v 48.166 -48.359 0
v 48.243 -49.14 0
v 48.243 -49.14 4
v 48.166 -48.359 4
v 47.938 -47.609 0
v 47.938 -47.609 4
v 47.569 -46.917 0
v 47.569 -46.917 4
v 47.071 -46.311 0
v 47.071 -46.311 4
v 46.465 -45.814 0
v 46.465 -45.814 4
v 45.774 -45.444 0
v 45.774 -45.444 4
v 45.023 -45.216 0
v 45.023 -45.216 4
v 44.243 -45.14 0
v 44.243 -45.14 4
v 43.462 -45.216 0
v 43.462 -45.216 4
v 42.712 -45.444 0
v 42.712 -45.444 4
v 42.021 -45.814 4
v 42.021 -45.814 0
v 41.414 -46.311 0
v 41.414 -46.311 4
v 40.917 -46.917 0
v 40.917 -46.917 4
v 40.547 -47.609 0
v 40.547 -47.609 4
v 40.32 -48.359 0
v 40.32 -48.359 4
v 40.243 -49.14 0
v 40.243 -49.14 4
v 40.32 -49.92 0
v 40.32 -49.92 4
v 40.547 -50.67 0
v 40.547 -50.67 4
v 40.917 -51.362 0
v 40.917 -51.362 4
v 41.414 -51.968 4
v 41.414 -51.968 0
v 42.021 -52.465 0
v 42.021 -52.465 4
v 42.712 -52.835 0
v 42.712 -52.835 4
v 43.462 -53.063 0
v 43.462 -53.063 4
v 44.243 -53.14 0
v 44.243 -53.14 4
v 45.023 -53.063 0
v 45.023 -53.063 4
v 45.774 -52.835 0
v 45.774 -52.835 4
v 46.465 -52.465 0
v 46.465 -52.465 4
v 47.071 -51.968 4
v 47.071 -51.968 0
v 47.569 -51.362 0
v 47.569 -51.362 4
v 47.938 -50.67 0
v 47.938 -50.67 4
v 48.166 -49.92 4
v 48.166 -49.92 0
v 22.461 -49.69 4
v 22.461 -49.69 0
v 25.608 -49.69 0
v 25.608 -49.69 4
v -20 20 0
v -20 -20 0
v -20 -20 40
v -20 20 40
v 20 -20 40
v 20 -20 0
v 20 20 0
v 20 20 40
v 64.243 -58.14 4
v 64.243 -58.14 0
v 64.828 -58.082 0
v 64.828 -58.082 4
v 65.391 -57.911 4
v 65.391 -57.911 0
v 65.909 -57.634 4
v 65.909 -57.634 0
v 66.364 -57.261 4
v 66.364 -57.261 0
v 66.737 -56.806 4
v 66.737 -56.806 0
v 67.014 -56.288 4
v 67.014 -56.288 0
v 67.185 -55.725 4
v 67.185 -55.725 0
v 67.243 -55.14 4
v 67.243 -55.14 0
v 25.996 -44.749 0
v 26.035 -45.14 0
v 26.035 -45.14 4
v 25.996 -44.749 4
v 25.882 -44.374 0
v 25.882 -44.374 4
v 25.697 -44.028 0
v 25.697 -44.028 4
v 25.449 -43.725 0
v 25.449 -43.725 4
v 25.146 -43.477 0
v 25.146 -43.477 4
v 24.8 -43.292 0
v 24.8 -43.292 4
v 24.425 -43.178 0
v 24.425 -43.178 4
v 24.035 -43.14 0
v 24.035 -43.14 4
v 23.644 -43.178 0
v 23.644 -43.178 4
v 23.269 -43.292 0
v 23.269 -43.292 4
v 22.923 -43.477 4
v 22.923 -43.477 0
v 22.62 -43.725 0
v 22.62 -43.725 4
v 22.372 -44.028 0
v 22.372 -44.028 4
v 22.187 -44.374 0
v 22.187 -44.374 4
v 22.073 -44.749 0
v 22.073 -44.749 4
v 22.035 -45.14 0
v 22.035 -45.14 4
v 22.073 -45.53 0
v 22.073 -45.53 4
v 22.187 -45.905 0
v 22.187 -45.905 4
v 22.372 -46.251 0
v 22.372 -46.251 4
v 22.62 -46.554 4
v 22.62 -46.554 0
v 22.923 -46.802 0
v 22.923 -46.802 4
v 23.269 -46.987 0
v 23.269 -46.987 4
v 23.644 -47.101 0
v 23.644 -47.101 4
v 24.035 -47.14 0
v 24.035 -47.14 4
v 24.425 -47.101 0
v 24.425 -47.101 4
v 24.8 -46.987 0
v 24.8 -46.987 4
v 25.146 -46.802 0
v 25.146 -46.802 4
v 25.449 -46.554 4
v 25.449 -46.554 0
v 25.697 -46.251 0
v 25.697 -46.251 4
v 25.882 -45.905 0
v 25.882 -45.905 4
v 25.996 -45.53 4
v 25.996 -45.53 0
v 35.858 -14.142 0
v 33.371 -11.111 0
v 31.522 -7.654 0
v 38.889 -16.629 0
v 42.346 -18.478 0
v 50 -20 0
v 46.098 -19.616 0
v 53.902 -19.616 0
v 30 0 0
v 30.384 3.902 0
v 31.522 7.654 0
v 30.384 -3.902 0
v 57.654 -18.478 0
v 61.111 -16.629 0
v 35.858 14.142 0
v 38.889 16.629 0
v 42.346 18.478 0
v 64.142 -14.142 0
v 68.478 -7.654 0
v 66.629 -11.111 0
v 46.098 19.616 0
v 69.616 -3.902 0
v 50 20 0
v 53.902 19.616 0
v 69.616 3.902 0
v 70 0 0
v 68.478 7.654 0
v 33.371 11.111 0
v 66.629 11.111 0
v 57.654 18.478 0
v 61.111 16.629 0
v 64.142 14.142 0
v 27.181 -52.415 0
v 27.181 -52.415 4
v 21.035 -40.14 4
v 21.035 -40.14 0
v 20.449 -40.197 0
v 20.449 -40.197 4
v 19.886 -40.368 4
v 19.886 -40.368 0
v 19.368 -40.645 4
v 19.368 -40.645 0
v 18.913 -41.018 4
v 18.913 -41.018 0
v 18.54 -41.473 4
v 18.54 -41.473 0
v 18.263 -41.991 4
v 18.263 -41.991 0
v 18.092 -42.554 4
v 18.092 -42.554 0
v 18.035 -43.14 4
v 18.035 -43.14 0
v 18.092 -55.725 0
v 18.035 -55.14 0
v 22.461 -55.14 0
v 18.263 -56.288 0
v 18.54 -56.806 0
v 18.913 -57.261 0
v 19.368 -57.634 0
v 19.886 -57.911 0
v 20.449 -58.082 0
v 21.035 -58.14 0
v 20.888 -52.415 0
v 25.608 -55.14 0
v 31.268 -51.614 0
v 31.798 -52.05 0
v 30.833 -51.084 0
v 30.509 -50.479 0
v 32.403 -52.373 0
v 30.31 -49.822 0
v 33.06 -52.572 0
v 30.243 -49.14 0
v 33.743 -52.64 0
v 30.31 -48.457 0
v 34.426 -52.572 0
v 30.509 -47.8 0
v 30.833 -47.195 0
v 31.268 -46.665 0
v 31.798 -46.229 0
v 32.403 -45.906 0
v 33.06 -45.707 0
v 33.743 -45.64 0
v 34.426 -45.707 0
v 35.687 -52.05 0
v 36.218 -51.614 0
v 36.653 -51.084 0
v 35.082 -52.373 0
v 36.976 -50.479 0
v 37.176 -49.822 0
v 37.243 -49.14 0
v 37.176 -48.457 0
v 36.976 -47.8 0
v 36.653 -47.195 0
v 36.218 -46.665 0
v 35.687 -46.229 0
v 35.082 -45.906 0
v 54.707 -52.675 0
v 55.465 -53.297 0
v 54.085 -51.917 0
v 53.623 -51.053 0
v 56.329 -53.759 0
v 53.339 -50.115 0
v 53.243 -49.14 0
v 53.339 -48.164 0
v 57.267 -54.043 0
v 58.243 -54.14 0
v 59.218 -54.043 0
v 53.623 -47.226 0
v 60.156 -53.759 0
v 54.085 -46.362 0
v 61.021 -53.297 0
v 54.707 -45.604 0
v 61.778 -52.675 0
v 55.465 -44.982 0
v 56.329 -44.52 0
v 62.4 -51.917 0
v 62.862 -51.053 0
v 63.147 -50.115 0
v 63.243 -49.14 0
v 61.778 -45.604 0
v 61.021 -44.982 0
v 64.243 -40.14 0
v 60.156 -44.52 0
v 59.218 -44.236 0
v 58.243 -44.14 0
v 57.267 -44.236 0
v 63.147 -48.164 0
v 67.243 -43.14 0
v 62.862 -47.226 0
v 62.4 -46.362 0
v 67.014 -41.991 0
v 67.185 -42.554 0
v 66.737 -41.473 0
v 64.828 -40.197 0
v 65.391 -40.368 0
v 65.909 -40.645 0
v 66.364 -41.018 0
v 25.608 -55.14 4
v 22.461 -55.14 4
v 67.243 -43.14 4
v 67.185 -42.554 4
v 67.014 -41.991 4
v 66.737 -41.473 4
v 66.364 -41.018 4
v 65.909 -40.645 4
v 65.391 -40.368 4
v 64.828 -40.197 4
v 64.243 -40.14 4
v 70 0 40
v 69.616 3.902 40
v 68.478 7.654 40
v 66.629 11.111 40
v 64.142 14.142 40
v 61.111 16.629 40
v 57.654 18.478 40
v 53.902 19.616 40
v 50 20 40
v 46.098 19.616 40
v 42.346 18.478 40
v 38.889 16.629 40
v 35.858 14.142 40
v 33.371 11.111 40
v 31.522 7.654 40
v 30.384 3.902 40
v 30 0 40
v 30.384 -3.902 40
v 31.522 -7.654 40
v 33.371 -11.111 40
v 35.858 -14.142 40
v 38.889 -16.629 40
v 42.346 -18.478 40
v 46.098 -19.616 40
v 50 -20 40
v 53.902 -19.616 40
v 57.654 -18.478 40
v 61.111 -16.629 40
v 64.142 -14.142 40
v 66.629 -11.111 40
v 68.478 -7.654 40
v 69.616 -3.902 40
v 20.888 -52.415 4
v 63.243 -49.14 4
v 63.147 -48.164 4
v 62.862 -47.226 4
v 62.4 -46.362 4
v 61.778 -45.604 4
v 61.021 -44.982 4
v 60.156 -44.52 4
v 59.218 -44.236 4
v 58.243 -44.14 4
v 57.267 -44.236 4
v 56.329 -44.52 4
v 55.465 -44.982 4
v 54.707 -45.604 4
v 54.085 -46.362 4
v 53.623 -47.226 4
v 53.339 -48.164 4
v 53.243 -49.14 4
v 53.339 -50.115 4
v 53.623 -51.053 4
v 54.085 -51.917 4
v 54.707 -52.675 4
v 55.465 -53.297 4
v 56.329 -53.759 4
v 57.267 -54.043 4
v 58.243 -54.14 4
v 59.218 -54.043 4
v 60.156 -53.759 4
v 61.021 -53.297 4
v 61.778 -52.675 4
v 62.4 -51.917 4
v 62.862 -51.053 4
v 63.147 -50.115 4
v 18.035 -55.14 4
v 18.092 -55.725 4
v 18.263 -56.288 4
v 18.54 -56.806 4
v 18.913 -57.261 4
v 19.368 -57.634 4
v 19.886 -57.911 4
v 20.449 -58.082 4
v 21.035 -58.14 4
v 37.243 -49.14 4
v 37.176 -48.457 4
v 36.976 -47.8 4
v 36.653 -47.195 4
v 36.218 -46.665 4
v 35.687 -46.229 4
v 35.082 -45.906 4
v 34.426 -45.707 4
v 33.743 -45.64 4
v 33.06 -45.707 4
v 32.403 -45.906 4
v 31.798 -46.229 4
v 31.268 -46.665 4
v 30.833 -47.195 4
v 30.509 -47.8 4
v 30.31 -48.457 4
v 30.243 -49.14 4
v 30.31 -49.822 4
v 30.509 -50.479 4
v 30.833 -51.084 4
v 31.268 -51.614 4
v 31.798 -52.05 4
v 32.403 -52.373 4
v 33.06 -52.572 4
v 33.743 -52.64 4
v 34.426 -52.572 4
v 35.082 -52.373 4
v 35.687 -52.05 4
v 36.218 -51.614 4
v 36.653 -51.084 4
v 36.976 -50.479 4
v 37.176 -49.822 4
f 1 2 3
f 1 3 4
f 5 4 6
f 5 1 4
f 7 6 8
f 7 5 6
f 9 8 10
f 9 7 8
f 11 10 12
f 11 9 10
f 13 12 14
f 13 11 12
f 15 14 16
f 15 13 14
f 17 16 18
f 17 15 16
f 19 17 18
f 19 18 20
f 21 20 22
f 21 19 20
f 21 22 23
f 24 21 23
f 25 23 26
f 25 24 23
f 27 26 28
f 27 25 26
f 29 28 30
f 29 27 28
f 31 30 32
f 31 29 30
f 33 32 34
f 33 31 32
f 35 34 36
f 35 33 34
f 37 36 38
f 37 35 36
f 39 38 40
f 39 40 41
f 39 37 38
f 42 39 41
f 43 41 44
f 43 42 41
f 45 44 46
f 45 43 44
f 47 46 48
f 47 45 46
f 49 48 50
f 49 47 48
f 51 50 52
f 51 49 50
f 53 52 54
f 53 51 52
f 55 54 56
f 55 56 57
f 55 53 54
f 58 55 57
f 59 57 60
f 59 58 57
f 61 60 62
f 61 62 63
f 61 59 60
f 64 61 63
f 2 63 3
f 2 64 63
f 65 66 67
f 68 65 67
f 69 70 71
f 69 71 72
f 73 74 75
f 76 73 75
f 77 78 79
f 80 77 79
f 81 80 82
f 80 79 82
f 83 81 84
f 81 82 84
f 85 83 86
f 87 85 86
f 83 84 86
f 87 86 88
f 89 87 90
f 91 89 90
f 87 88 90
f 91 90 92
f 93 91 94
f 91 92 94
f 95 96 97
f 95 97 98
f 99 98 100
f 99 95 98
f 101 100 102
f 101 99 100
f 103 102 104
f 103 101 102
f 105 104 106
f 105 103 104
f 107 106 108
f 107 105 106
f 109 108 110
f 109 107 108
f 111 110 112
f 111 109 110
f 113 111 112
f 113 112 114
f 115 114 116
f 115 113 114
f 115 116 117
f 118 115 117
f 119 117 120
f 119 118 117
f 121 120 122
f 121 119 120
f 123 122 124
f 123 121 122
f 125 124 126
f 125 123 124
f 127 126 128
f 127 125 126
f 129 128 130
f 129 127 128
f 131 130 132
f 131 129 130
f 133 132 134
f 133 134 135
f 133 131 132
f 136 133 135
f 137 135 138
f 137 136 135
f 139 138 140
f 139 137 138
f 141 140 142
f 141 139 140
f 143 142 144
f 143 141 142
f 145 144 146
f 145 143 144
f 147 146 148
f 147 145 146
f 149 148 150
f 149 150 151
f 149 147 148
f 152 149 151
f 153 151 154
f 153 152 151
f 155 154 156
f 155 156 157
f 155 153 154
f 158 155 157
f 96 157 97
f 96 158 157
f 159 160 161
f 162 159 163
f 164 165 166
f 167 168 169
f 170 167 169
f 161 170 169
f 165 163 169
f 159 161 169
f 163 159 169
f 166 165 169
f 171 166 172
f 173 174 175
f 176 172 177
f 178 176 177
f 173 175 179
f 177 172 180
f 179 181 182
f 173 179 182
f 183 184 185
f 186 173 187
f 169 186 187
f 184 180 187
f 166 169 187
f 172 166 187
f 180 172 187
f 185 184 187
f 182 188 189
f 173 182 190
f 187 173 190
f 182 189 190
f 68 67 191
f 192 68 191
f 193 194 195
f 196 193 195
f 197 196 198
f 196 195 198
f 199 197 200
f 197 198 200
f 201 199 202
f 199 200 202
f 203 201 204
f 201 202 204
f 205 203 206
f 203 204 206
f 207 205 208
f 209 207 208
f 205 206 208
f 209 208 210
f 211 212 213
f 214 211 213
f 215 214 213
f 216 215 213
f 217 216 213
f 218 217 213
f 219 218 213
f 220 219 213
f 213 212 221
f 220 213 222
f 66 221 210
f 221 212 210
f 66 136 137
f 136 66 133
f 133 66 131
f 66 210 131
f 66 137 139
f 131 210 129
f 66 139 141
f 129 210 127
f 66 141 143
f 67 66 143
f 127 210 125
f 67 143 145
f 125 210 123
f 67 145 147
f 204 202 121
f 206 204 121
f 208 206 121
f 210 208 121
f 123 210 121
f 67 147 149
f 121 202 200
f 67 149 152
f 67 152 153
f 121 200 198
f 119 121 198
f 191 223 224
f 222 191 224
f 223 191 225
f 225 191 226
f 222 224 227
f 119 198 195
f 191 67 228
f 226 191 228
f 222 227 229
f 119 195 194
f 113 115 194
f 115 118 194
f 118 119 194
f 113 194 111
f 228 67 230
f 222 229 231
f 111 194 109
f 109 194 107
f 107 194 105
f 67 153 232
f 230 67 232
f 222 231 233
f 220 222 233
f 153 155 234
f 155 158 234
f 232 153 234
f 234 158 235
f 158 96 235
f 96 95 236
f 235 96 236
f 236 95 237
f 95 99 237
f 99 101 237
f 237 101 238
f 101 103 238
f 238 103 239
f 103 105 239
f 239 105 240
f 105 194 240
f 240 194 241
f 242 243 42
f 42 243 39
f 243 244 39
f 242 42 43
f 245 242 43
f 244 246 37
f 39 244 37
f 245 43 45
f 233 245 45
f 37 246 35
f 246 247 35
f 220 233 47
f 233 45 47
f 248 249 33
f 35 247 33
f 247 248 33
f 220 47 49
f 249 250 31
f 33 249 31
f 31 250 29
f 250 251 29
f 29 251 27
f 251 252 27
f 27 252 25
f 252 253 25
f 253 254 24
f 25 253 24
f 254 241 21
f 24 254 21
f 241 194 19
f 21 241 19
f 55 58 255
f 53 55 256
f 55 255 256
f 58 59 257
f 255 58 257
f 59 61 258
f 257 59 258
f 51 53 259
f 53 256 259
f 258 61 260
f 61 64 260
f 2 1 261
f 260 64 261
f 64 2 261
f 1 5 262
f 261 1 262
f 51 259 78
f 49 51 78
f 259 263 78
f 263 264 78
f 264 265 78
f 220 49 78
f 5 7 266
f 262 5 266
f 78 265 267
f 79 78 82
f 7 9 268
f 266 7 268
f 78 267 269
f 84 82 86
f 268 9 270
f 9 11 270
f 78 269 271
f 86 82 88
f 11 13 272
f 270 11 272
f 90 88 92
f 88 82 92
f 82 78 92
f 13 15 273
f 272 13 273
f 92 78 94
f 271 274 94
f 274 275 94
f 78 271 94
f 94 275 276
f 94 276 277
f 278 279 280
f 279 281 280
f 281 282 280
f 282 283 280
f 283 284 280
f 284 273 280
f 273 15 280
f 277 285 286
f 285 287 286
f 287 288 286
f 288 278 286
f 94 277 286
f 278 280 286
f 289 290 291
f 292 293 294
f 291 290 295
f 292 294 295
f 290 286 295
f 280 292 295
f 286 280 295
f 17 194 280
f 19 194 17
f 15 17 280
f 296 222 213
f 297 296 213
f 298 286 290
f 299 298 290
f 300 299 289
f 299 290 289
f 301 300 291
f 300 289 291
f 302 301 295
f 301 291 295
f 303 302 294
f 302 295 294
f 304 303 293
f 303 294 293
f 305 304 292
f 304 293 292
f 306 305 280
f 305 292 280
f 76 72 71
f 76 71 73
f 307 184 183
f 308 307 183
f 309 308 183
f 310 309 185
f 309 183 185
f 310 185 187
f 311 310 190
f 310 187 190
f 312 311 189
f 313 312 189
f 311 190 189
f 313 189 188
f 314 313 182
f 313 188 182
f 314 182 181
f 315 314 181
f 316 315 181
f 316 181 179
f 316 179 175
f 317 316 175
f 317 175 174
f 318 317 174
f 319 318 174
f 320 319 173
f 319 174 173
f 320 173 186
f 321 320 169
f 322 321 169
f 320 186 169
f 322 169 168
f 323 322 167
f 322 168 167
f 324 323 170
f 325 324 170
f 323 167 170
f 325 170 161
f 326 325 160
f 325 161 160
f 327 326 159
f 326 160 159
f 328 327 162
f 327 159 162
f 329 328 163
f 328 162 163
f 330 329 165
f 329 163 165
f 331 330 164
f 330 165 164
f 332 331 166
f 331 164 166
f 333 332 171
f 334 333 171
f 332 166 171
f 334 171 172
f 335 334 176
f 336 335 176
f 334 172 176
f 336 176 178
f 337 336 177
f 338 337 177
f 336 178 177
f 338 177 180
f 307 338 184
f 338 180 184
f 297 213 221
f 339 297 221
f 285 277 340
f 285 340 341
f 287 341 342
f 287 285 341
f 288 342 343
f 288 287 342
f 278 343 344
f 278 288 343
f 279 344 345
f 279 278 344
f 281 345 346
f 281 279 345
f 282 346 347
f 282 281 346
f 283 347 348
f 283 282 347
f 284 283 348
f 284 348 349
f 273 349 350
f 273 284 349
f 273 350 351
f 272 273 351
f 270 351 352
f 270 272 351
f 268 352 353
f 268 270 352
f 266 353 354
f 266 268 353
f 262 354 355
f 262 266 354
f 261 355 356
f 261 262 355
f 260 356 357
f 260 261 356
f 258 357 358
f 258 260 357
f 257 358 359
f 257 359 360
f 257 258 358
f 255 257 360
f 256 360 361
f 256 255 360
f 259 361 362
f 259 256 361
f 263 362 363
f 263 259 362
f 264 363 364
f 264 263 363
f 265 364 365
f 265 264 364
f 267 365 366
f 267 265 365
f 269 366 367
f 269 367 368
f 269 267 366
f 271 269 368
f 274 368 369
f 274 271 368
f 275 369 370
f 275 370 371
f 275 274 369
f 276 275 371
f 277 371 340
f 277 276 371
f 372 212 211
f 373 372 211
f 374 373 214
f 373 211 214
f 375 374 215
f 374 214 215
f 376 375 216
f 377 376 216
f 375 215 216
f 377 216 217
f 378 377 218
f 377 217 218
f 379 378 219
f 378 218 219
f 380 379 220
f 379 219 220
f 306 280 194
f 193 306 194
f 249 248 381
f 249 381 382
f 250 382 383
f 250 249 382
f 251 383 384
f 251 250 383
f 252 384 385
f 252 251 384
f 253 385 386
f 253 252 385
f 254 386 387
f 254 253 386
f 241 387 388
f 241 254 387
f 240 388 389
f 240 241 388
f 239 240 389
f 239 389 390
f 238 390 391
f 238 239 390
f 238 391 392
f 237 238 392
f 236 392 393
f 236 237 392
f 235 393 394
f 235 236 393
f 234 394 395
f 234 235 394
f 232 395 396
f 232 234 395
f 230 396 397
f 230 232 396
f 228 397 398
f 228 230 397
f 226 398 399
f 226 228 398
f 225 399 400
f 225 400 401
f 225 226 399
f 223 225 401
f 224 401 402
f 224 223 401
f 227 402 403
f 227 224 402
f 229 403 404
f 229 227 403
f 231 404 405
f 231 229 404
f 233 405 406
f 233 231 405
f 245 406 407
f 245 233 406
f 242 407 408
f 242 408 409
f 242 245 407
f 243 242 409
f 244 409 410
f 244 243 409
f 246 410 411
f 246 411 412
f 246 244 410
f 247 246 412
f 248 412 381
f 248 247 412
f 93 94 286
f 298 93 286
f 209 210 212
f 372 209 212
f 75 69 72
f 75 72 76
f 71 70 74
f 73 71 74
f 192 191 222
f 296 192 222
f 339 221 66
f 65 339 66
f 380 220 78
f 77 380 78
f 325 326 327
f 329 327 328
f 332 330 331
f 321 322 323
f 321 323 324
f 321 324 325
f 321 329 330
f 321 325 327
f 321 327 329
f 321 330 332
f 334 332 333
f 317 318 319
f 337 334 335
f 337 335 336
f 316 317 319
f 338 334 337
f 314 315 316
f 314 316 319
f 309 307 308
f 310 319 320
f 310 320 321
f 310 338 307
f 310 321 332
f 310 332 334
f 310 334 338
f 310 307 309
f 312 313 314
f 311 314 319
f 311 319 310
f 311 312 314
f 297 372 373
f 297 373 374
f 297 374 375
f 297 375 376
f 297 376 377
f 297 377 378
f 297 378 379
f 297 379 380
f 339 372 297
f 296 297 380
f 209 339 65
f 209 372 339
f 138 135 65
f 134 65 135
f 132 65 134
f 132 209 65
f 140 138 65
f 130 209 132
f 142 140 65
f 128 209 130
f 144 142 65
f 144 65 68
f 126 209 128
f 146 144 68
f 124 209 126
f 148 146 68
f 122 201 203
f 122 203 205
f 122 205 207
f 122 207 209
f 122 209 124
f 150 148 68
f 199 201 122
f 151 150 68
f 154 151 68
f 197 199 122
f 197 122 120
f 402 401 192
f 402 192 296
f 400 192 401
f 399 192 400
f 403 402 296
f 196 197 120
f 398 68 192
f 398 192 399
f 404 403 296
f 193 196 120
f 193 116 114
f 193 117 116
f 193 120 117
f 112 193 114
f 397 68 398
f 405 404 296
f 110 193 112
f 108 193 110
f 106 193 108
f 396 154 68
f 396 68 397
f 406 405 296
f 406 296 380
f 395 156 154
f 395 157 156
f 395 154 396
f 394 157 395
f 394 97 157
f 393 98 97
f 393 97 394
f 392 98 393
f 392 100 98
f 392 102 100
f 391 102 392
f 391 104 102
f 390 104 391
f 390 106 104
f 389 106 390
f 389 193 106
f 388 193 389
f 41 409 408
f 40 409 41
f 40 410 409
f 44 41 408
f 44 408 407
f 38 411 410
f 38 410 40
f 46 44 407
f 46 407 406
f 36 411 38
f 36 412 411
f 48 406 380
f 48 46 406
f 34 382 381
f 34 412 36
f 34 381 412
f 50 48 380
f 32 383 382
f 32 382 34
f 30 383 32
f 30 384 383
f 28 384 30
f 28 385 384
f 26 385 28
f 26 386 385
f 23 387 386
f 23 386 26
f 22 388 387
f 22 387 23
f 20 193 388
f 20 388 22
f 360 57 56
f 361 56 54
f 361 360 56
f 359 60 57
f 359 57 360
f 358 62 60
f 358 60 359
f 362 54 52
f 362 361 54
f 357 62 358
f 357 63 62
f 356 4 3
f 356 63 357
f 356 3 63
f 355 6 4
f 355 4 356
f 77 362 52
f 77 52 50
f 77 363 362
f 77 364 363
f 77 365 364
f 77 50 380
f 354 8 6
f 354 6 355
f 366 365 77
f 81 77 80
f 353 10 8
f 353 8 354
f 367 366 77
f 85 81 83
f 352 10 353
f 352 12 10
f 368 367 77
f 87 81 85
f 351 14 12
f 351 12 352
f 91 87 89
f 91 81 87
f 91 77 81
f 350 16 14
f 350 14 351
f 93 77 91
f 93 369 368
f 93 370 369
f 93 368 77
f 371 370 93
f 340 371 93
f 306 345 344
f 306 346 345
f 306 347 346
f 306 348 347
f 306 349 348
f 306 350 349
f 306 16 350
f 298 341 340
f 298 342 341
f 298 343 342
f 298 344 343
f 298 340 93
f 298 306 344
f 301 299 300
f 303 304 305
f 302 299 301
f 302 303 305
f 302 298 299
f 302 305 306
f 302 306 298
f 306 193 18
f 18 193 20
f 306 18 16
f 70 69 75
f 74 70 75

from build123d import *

# Parameters (mm, degrees)
F0_W     = 40
F0_H     = 40
F1_DEPTH = 40
F2_R     = 20
F3_DEPTH = 40
F4_R     = 3.5
F4_R_2   = 4
F4_R_3   = 2
F4_R_4   = 5
F5_DEPTH = 4


with BuildPart() as f1:
    # F0 (on Top) → F1 (new body)
    with BuildSketch(Plane.XY):
        Rectangle(F0_W, F0_H)
    extrude(amount=F1_DEPTH)


with BuildPart() as f3:
    # F2 (on Top) → F3 (new body, through all)
    with BuildSketch(Plane.XY):
        with Locations((50, 0)):
            Circle(F2_R)
    extrude(amount=F3_DEPTH)


with BuildPart() as f5:
    # F4 (on Top) → F5 (new body)
    with BuildSketch(Plane.XY):
        with BuildLine():
            Line((64.242783, -40.139524), (21.034539, -40.139524))
            ThreePointArc((21.034539, -40.139524), (18.913218, -41.018203), (18.034539, -43.139524))
            Line((18.034539, -43.139524), (18.034539, -55.139524))
            ThreePointArc((18.034539, -55.139524), (18.913218, -57.260844), (21.034539, -58.139524))
            Line((21.034539, -58.139524), (64.242783, -58.139524))
            ThreePointArc((64.242783, -58.139524), (66.364103, -57.260844), (67.242783, -55.139524))
            Line((67.242783, -55.139524), (67.242783, -43.139524))
            ThreePointArc((67.242783, -43.139524), (66.364103, -41.018203), (64.242783, -40.139524))
        make_face()
        Polygon((25.607818, -49.689524), (27.181098, -52.414524), (25.607818, -55.139524), (22.461259, -55.139524), (20.88798, -52.414524), (22.461259, -49.689524), align=None, mode=Mode.SUBTRACT)
        with Locations((33.742783, -49.139524)):
            Circle(F4_R, mode=Mode.SUBTRACT)
        with Locations((44.242783, -49.139524)):
            Circle(F4_R_2, mode=Mode.SUBTRACT)
        with Locations((24.034539, -45.139524)):
            Circle(F4_R_3, mode=Mode.SUBTRACT)
        with Locations((58.242783, -49.139524)):
            Circle(F4_R_4, mode=Mode.SUBTRACT)
    extrude(amount=F5_DEPTH)


solid = Compound([f1.part, f3.part, f5.part])
